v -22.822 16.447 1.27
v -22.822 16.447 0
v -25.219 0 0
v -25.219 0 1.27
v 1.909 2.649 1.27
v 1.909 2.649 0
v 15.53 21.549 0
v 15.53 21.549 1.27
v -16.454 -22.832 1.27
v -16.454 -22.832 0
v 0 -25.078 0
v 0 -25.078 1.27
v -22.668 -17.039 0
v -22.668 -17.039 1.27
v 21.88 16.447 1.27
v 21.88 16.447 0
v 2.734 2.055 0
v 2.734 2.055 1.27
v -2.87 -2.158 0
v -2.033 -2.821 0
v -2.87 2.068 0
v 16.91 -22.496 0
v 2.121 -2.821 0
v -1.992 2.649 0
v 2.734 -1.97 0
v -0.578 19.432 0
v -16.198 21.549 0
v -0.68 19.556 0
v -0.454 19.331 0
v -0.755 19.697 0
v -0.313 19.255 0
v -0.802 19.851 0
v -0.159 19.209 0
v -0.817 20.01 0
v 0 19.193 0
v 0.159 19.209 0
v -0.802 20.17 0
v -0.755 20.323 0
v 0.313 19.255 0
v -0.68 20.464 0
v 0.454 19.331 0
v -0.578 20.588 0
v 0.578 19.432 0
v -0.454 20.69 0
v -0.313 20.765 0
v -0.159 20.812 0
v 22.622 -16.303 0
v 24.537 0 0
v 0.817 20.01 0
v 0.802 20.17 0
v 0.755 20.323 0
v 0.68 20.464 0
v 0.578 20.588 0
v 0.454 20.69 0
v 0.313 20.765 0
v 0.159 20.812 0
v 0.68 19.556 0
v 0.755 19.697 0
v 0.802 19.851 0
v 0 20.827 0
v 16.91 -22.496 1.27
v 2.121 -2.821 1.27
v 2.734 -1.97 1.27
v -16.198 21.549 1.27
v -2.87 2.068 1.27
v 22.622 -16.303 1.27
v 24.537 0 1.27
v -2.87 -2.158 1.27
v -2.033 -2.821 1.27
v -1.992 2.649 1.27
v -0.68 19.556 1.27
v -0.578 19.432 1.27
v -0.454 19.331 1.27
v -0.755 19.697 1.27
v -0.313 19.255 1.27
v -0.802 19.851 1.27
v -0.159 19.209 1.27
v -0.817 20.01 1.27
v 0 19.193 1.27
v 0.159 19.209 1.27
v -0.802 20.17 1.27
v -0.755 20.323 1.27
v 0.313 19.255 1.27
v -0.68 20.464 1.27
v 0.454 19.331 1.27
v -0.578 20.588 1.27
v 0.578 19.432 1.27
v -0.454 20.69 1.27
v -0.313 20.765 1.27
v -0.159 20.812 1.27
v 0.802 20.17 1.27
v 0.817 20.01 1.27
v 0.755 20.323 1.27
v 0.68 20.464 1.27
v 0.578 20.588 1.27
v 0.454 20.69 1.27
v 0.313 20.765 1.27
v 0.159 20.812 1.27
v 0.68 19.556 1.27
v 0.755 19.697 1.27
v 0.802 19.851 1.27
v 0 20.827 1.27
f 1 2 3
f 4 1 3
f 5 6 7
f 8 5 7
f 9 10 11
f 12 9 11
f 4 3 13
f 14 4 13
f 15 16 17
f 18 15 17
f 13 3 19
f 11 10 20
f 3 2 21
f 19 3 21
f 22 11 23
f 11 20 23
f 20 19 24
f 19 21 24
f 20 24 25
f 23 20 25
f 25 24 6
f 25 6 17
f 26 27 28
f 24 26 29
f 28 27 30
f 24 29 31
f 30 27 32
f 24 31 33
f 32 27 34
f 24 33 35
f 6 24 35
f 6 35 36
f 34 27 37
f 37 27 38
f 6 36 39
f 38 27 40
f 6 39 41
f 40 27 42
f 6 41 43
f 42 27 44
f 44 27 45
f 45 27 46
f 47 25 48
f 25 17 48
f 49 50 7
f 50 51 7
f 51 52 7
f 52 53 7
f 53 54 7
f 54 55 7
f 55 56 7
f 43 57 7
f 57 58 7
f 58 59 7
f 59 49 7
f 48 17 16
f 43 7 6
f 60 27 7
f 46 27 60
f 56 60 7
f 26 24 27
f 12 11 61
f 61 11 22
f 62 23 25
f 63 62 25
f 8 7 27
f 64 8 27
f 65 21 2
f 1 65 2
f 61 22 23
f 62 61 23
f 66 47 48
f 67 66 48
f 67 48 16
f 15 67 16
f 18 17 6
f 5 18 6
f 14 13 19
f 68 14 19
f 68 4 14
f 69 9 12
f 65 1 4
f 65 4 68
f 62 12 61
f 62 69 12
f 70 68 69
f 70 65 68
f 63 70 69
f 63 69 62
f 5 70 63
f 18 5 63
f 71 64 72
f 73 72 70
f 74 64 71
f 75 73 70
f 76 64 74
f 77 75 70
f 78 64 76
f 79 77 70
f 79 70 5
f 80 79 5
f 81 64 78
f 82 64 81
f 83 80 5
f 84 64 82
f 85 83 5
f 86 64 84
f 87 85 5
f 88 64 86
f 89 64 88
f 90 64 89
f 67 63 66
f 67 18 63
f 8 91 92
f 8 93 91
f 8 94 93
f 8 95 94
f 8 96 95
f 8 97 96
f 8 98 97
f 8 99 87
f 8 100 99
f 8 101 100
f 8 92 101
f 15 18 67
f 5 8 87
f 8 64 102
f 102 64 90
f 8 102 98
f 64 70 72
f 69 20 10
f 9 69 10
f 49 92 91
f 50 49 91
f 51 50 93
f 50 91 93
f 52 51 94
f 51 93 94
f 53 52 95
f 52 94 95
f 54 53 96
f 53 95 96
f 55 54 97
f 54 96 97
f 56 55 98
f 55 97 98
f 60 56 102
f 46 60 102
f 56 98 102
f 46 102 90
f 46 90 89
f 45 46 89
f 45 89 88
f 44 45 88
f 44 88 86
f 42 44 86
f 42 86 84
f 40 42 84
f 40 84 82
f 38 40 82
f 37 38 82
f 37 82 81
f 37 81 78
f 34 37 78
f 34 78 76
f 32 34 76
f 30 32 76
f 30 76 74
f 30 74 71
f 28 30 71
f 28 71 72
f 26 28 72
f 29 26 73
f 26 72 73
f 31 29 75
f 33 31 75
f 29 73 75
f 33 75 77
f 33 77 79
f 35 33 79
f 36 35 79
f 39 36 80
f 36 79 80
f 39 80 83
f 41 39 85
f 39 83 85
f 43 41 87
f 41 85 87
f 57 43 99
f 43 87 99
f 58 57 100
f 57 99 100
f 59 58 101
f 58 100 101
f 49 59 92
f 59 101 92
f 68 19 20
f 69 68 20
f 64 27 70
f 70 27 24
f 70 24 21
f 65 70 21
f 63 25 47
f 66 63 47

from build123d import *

# Parameters (mm, degrees)
F1_DEPTH = 1.27
F2_R     = 0.817287
F3_DEPTH = 12.7


with BuildPart() as f1:
    # F0 (on Top) → F1 (new body)
    with BuildSketch(Plane.XY):
        Polygon((2.120686, -2.821234), (0, -2.821234), (0, -25.078306), (16.910204, -22.496327), align=None)
        Polygon((-1.991502, 2.649376), (0, 2.649376), (0, 21.549277), (-16.198318, 21.549277), align=None)
        Polygon((0, 21.549277), (0, 2.649376), (1.909298, 2.649376), (15.529687, 21.549277), align=None)
        Polygon((24.537329, 0), (2.733955, 0), (2.733955, -1.97025), (22.622143, -16.302859), align=None)
        Polygon((2.733955, 2.055079), (2.733955, 0), (24.537329, 0), (21.880006, 16.446924), align=None)
        Polygon((-25.219401, 0), (-2.87027, 0), (-2.87027, 2.068487), (-22.82205, 16.446924), align=None)
        Polygon((-2.87027, -2.157545), (-2.87027, 0), (-25.219401, 0), (-22.667898, -17.039172), align=None)
        Polygon((0, -25.078306), (0, -2.821234), (-2.033148, -2.821234), (-16.454118, -22.832033), align=None)
        Polygon((2.733955, 0), (0, 0), (0, -2.821234), (2.120686, -2.821234), (2.733955, -1.97025), align=None)
        Polygon((0, 2.649376), (0, 0), (2.733955, 0), (2.733955, 2.055079), (1.909298, 2.649376), align=None)
        Polygon((-2.87027, 0), (0, 0), (0, 2.649376), (-1.991502, 2.649376), (-2.87027, 2.068487), align=None)
        Polygon((0, -2.821234), (0, 0), (-2.87027, 0), (-2.87027, -2.157545), (-2.033148, -2.821234), align=None)
    extrude(amount=F1_DEPTH)

    # F2 (on face) → F3 (cut)
    with BuildSketch(Plane.XY.offset(1.27)):
        with Locations((0, 20.010149)):
            Circle(F2_R)
    extrude(amount=-F3_DEPTH, mode=Mode.SUBTRACT)


solid = f1.part
